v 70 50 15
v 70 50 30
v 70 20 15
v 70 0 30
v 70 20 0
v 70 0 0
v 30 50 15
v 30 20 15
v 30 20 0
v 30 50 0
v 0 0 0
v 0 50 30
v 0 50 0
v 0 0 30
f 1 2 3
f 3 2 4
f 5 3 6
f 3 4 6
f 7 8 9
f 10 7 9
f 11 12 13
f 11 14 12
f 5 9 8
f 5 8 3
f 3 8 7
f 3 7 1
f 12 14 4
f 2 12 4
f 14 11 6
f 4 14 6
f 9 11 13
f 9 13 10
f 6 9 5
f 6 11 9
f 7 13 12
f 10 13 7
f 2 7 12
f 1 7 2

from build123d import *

# Parameters (mm, degrees)
BOSS_EXTRUDE3_DEPTH      = 30
BOSS_EXTRUDE3_DEPTH_BACK = 0.0001
SKETCH4_W                = 70
SKETCH4_H                = 20
SKETCH6_W                = 30
SKETCH6_H                = 30.0001
BOSS_EXTRUDE4_DEPTH      = 30
SKETCH7_W                = 40
SKETCH7_H                = 15.00005
BOSS_EXTRUDE5_DEPTH      = 30


with BuildPart() as part:
    # Sketch4 → Boss-Extrude3 (new, two sides: drawn at the far end of the back side and taken through both)
    with BuildSketch(Plane.XY.offset(-BOSS_EXTRUDE3_DEPTH_BACK)):
        with Locations((35, 10)):
            Rectangle(SKETCH4_W, SKETCH4_H)
    extrude(amount=BOSS_EXTRUDE3_DEPTH + BOSS_EXTRUDE3_DEPTH_BACK)

    # Sketch6 → Boss-Extrude4 (add)
    with BuildSketch(Plane(origin=(0, 20, 0), x_dir=(1, 0, 0), z_dir=(0, 1, 0))):
        with Locations((15, -14.99995)):
            Rectangle(SKETCH6_W, SKETCH6_H)
    extrude(amount=BOSS_EXTRUDE4_DEPTH)

    # Sketch7 → Boss-Extrude5 (add)
    with BuildSketch(Plane(origin=(0, 20, 0), x_dir=(1, 0, 0), z_dir=(0, 1, 0))):
        with Locations((50, -22.499975)):
            Rectangle(SKETCH7_W, SKETCH7_H)
    extrude(amount=BOSS_EXTRUDE5_DEPTH)


solid = part.part
